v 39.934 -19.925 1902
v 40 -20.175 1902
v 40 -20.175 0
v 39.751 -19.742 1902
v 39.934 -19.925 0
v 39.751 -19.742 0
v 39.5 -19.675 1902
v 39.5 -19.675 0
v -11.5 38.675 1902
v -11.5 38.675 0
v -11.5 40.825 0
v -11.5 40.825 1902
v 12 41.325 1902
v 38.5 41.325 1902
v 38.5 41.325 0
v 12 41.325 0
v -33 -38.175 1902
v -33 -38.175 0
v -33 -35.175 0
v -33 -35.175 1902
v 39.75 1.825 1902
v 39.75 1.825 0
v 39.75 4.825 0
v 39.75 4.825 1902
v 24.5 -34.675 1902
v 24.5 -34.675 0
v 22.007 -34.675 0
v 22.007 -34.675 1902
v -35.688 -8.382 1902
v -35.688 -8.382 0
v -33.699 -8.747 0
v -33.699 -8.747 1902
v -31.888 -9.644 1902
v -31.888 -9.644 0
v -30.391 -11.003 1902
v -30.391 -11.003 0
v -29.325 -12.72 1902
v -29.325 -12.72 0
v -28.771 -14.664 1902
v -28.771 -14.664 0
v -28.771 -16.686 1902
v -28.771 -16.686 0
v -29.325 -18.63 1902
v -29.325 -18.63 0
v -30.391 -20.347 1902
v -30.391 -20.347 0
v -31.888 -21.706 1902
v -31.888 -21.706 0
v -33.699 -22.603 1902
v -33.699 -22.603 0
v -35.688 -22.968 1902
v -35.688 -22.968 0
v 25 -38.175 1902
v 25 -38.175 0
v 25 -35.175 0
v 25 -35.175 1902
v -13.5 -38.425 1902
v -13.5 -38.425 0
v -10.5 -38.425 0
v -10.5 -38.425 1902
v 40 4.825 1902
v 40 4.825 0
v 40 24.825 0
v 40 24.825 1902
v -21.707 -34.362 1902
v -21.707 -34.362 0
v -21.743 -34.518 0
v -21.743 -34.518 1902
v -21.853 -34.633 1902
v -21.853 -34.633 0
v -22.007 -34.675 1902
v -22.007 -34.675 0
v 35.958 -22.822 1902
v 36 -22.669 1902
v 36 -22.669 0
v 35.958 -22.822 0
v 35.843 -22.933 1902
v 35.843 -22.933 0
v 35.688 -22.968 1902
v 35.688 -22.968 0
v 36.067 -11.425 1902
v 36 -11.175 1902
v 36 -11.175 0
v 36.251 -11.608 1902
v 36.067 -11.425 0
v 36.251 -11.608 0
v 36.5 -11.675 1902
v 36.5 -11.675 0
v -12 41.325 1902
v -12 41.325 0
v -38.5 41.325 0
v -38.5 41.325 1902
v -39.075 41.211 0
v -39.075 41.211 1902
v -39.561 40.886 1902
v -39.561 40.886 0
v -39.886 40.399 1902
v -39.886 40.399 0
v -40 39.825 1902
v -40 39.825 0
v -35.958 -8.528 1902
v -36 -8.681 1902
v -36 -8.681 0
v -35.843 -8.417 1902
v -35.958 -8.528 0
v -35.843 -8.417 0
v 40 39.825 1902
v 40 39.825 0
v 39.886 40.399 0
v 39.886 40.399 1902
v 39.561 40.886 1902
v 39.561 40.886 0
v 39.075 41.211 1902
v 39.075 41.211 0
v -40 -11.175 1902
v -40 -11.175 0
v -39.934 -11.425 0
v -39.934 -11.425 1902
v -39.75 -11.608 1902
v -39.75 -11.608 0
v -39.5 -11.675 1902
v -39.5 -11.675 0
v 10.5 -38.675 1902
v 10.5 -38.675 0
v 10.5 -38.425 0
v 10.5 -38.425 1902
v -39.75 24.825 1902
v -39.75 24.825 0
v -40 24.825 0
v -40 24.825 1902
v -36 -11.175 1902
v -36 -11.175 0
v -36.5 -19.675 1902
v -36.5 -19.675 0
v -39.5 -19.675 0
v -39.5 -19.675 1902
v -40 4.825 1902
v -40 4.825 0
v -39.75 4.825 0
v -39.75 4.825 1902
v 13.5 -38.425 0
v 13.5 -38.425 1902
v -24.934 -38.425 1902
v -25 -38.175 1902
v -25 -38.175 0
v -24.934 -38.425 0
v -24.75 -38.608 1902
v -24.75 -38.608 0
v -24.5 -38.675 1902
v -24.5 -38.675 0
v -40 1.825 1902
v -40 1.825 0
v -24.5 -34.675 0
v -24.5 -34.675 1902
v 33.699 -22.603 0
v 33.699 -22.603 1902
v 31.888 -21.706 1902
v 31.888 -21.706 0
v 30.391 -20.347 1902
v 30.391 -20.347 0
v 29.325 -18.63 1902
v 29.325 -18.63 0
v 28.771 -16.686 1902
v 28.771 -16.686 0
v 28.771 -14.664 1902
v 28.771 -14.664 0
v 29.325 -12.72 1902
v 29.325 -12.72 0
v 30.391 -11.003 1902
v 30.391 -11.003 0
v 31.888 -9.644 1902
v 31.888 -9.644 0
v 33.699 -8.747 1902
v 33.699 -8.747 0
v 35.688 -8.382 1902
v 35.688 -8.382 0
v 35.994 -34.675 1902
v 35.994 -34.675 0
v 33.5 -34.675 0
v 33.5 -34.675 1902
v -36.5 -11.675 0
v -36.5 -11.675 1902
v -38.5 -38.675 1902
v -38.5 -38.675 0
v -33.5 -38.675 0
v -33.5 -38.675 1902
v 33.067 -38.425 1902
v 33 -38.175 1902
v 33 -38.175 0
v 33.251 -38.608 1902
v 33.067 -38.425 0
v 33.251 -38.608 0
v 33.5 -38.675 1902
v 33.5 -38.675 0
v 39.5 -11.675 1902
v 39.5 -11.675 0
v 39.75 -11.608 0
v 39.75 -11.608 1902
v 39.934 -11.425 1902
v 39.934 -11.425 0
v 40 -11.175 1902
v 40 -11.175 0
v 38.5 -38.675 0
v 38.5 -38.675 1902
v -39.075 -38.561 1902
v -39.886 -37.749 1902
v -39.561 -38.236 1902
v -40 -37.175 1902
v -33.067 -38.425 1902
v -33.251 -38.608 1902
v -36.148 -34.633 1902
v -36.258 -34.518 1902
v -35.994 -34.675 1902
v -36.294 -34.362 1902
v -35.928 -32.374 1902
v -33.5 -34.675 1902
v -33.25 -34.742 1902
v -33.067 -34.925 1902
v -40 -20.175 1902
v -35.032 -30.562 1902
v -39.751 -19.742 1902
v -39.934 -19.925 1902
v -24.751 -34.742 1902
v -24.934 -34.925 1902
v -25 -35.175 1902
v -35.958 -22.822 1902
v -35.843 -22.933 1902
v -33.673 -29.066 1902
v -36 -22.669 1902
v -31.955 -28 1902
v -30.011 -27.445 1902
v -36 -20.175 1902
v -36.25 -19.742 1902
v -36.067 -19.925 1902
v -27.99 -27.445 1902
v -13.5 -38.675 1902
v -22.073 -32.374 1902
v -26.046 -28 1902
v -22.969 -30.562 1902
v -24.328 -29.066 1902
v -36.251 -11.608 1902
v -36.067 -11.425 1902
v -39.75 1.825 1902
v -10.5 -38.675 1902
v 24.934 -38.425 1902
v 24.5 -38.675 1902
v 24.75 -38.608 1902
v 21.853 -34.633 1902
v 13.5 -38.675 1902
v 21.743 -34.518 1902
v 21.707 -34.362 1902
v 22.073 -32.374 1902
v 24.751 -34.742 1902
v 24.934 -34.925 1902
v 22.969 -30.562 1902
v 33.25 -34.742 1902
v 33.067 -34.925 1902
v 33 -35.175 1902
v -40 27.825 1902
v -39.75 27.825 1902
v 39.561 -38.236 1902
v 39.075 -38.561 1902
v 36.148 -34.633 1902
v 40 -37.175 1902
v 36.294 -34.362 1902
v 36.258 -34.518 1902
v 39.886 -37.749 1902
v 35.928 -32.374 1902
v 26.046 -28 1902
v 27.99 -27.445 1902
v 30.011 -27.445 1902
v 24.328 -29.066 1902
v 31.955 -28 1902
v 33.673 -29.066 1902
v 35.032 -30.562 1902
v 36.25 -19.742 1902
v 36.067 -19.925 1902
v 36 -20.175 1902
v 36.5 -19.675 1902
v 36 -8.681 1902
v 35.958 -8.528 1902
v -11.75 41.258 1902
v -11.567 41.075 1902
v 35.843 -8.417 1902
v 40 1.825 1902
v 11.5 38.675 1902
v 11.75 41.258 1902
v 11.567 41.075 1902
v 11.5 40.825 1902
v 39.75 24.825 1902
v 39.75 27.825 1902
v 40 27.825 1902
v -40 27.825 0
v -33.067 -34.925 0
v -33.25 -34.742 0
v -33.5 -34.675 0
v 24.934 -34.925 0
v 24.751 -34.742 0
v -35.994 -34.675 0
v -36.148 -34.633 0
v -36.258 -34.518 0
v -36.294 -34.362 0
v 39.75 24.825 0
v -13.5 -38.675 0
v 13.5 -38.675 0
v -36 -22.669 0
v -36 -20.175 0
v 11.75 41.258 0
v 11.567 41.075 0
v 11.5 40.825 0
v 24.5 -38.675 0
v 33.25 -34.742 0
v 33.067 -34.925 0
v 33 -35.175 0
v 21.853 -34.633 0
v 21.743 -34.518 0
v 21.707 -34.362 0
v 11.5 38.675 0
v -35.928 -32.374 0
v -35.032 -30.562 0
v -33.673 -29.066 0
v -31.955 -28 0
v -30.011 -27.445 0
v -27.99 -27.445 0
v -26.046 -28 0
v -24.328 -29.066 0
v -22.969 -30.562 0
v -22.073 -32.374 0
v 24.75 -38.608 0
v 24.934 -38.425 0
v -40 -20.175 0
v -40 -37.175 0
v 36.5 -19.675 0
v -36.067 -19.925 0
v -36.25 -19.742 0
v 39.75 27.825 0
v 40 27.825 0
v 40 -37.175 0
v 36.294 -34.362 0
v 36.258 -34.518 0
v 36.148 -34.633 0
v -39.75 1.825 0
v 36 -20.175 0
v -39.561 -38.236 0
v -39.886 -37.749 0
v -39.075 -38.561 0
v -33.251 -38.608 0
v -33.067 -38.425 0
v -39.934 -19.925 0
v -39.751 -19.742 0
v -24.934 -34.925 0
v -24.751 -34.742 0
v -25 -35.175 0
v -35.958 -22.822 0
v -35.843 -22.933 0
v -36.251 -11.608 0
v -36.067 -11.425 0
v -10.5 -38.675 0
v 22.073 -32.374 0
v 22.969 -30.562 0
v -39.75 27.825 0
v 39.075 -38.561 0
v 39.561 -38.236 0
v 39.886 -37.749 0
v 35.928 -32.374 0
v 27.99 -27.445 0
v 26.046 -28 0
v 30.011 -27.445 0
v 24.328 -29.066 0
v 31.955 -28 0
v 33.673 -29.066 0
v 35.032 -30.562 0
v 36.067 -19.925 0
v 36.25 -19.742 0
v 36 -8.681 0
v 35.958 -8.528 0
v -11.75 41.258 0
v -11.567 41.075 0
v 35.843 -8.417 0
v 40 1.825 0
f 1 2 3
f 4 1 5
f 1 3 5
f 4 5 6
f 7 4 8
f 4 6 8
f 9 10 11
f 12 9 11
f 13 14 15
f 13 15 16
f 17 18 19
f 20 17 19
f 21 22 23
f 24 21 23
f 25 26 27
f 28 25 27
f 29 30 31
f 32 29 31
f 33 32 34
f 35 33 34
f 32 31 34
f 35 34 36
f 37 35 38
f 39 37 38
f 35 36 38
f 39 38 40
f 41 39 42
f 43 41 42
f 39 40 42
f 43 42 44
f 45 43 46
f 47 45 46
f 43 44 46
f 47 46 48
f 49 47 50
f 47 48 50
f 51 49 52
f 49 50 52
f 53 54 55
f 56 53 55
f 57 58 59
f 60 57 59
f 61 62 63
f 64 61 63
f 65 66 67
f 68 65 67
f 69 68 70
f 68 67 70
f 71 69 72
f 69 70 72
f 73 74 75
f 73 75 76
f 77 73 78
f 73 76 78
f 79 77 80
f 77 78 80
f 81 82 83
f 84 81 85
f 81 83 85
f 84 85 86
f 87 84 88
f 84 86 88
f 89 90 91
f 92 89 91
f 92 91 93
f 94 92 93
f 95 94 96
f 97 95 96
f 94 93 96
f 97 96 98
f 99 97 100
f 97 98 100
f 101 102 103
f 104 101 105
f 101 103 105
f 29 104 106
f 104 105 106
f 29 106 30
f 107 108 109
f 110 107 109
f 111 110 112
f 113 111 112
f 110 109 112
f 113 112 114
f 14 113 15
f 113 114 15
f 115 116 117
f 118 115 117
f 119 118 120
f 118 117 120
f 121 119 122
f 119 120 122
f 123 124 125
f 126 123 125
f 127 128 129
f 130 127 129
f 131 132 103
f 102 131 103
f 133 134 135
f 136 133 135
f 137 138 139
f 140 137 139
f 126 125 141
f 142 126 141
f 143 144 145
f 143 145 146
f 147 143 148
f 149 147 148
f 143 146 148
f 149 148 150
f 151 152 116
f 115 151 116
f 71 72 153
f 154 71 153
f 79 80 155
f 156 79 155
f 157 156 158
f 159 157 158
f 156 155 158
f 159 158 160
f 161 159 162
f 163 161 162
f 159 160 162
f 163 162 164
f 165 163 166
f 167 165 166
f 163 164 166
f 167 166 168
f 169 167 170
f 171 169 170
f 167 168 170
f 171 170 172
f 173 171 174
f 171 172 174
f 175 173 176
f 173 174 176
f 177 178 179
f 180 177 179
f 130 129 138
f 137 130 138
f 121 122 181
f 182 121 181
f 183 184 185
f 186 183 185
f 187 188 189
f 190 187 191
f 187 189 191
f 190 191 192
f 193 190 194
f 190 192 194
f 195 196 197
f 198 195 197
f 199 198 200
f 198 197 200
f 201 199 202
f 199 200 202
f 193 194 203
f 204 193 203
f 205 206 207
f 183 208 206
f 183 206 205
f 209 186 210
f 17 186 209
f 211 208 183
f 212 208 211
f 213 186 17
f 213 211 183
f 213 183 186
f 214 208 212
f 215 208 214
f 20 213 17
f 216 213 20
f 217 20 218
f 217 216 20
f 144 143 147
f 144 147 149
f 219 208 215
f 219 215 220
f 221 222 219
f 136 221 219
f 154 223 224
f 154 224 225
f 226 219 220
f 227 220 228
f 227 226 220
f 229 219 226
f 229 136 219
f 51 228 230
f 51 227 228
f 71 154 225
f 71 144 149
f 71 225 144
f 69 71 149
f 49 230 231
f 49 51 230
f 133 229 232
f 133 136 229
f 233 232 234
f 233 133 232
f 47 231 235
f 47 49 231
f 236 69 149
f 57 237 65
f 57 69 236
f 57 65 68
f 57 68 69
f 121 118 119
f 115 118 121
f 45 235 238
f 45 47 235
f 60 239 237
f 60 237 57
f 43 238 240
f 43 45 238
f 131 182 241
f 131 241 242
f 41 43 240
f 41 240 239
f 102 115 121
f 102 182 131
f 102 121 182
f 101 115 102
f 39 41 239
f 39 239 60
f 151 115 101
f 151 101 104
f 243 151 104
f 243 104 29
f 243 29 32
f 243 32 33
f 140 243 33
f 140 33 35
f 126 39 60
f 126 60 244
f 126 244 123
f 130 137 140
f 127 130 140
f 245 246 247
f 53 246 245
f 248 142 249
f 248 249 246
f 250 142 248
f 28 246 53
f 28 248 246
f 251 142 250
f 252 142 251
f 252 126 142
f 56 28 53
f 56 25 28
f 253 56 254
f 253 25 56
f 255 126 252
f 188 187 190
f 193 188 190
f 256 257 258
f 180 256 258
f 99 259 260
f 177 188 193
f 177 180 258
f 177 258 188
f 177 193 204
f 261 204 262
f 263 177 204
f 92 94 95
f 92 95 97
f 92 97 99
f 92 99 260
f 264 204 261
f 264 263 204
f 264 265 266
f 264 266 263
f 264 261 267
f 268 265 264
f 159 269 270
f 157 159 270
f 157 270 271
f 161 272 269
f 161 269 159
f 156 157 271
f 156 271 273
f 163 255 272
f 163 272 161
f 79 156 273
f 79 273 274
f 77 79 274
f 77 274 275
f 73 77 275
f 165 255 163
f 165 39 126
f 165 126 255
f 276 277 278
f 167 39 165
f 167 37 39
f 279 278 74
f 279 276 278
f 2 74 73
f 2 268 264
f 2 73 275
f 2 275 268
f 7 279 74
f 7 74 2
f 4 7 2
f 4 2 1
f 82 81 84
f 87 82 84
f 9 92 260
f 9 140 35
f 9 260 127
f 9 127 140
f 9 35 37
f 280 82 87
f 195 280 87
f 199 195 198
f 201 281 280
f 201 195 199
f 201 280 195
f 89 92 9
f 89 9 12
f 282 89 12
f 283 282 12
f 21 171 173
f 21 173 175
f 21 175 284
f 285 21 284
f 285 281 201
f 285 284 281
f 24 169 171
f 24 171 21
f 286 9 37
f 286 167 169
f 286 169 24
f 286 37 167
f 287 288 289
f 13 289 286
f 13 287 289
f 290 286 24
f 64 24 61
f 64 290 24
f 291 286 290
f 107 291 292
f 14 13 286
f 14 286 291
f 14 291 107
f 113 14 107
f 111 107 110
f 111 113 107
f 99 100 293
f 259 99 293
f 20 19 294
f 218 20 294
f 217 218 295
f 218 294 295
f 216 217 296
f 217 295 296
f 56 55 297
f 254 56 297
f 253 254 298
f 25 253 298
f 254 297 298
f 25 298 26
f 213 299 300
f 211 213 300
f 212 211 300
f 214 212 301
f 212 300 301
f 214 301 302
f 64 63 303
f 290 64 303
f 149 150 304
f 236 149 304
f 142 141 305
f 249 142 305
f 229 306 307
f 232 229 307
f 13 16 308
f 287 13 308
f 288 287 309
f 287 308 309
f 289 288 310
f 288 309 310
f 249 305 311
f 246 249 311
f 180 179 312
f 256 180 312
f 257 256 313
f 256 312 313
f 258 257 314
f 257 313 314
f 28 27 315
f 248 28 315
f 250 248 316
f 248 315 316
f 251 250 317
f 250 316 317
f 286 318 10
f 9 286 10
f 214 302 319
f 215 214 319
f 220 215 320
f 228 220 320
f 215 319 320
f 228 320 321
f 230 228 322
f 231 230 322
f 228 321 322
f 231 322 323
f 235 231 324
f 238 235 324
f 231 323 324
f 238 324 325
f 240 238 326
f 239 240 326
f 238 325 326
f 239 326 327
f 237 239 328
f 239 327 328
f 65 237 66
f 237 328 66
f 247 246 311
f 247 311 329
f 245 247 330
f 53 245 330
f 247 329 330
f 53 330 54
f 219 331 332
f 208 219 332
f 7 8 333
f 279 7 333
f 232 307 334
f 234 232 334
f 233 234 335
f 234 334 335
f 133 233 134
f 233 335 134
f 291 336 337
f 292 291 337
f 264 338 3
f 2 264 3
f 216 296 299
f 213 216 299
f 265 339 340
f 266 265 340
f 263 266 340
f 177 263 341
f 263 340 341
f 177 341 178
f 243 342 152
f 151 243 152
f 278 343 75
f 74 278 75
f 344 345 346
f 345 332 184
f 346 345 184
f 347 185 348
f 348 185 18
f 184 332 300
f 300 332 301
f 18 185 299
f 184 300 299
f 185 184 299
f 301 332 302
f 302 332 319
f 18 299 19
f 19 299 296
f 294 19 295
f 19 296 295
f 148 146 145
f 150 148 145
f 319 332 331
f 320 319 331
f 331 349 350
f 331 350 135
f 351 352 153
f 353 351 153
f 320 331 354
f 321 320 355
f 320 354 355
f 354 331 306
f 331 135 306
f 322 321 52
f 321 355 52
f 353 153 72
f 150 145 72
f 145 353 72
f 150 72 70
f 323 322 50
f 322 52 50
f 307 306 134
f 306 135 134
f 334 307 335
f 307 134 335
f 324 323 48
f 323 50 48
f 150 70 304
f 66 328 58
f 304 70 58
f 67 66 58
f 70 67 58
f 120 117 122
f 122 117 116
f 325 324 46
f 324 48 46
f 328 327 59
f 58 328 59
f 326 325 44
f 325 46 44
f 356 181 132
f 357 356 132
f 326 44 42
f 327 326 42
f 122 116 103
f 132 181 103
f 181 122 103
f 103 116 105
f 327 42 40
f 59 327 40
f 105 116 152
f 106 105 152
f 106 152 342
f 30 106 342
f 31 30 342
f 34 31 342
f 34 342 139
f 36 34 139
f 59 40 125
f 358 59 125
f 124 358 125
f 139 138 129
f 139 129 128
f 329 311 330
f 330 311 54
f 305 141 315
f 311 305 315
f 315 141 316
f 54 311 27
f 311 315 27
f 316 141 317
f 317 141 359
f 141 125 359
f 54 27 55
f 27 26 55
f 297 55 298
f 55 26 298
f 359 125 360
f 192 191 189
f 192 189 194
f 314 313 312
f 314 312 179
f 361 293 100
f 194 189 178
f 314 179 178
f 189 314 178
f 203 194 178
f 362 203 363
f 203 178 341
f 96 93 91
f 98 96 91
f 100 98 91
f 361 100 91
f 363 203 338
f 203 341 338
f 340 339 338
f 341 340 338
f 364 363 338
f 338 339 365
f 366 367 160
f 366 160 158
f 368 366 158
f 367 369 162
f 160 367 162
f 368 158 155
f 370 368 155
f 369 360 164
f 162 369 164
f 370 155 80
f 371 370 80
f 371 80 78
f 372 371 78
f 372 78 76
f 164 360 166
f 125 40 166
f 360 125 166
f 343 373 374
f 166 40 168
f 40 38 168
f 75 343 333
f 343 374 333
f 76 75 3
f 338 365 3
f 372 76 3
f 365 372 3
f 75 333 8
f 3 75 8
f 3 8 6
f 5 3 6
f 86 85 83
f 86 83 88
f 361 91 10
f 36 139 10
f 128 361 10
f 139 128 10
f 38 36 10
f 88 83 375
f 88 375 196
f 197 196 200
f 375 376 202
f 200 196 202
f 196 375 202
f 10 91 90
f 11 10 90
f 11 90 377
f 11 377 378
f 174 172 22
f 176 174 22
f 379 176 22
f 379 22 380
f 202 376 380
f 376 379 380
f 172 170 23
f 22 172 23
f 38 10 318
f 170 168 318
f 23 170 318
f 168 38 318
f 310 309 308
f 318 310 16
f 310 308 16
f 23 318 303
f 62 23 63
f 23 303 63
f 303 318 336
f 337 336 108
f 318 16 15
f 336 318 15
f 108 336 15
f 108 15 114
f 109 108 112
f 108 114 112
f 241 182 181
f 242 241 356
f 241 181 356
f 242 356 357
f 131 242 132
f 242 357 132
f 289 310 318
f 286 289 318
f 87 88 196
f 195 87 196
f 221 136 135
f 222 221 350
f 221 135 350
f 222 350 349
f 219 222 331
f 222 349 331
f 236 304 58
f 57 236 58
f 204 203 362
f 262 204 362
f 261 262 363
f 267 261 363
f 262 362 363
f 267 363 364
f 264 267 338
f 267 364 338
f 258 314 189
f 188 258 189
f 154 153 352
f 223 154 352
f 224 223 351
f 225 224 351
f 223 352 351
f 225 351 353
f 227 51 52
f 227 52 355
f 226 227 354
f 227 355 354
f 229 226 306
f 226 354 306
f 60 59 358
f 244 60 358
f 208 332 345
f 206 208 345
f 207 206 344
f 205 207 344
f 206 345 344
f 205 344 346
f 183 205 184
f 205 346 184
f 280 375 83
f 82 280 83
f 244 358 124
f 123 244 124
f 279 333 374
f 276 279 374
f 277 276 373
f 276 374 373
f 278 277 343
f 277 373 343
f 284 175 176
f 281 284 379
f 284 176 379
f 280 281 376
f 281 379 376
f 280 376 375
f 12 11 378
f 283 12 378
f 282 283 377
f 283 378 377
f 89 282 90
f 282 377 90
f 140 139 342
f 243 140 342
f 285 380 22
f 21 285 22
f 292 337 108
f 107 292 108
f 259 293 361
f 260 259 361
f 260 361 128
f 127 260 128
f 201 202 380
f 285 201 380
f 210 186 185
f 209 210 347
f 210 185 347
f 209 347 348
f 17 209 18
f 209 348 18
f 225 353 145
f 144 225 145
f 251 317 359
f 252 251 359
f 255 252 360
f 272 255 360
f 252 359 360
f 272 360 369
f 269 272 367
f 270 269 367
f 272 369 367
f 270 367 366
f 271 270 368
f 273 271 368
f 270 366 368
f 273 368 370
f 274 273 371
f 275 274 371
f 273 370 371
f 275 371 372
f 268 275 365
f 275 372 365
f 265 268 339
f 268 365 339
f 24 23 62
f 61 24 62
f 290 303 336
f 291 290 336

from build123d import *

# Parameters (mm, degrees)
BOSS_EXTRU_1_DEPTH = 1902


with BuildPart() as part:
    # Esquisse1 → Boss.-Extru.1 (new body)
    with BuildSketch(Plane.XY):
        with BuildLine():
            Line((-36.0005, -22.668579891), (-36.0005, -20.175011417))
            ThreePointArc((-36.0005, -20.175011417), (-36.146946609, -19.821458026), (-36.5005, -19.675011417))
            Line((-36.5005, -19.675011417), (-39.5005, -19.675011417))
            ThreePointArc((-39.5005, -19.675011417), (-39.854053391, -19.821458026), (-40.0005, -20.175011417))
            Line((-40.0005, -20.175011417), (-40.0005, -37.175011417))
            ThreePointArc((-40.0005, -37.175011417), (-39.561160172, -38.235671589), (-38.5005, -38.675011417))
            Line((-38.5005, -38.675011417), (-33.5005, -38.675011417))
            ThreePointArc((-33.5005, -38.675011417), (-33.146946609, -38.528564807), (-33.0005, -38.175011417))
            Line((-33.0005, -38.175011417), (-33.0005, -35.175011417))
            ThreePointArc((-33.0005, -35.175011417), (-33.146946609, -34.821458026), (-33.5005, -34.675011417))
            Line((-33.5005, -34.675011417), (-35.994068474, -34.675011417))
            ThreePointArc((-35.994068474, -34.675011417), (-36.210698507, -34.582547988), (-36.293792837, -34.362154274))
            ThreePointArc((-36.293792837, -34.362154274), (-29.0005, -27.375011417), (-21.707207163, -34.362154274))
            ThreePointArc((-21.707207163, -34.362154274), (-21.790301493, -34.582547988), (-22.006931526, -34.675011417))
            Line((-22.006931526, -34.675011417), (-24.5005, -34.675011417))
            ThreePointArc((-24.5005, -34.675011417), (-24.854053391, -34.821458026), (-25.0005, -35.175011417))
            Line((-25.0005, -35.175011417), (-25.0005, -38.175011417))
            ThreePointArc((-25.0005, -38.175011417), (-24.854053391, -38.528564807), (-24.5005, -38.675011417))
            Line((-24.5005, -38.675011417), (-13.5005, -38.675011417))
            Line((-13.5005, -38.675011417), (-13.5005, -38.425011417))
            Line((-13.5005, -38.425011417), (-10.5005, -38.425011417))
            Line((-10.5005, -38.425011417), (-10.5005, -38.675011417))
            Line((-10.5005, -38.675011417), (10.5005, -38.675011417))
            Line((10.5005, -38.675011417), (10.5005, -38.425011417))
            Line((10.5005, -38.425011417), (13.5005, -38.425011417))
            Line((13.5005, -38.425011417), (13.5005, -38.675011417))
            Line((13.5005, -38.675011417), (24.5005, -38.675011417))
            ThreePointArc((24.5005, -38.675011417), (24.854053391, -38.528564807), (25.0005, -38.175011417))
            Line((25.0005, -38.175011417), (25.0005, -35.175011417))
            ThreePointArc((25.0005, -35.175011417), (24.854053391, -34.821458026), (24.5005, -34.675011417))
            Line((24.5005, -34.675011417), (22.006931526, -34.675011417))
            ThreePointArc((22.006931526, -34.675011417), (21.790301493, -34.582547988), (21.707207163, -34.362154274))
            ThreePointArc((21.707207163, -34.362154274), (29.0005, -27.375011417), (36.293792837, -34.362154274))
            ThreePointArc((36.293792837, -34.362154274), (36.210698507, -34.582547988), (35.994068474, -34.675011417))
            Line((35.994068474, -34.675011417), (33.5005, -34.675011417))
            ThreePointArc((33.5005, -34.675011417), (33.146946609, -34.821458026), (33.0005, -35.175011417))
            Line((33.0005, -35.175011417), (33.0005, -38.175011417))
            ThreePointArc((33.0005, -38.175011417), (33.146946609, -38.528564807), (33.5005, -38.675011417))
            Line((33.5005, -38.675011417), (38.5005, -38.675011417))
            ThreePointArc((38.5005, -38.675011417), (39.561160172, -38.235671589), (40.0005, -37.175011417))
            Line((40.0005, -37.175011417), (40.0005, -20.175011417))
            ThreePointArc((40.0005, -20.175011417), (39.854053391, -19.821458026), (39.5005, -19.675011417))
            Line((39.5005, -19.675011417), (36.5005, -19.675011417))
            ThreePointArc((36.5005, -19.675011417), (36.146946609, -19.821458026), (36.0005, -20.175011417))
            Line((36.0005, -20.175011417), (36.0005, -22.668579891))
            ThreePointArc((36.0005, -22.668579891), (35.908036572, -22.885209924), (35.687642857, -22.968304254))
            ThreePointArc((35.687642857, -22.968304254), (28.7005, -15.675011417), (35.687642857, -8.38171858))
            ThreePointArc((35.687642857, -8.38171858), (35.908036572, -8.464812909), (36.0005, -8.681442943))
            Line((36.0005, -8.681442943), (36.0005, -11.175011417))
            ThreePointArc((36.0005, -11.175011417), (36.146946609, -11.528564807), (36.5005, -11.675011417))
            Line((36.5005, -11.675011417), (39.5005, -11.675011417))
            ThreePointArc((39.5005, -11.675011417), (39.854053391, -11.528564807), (40.0005, -11.175011417))
            Line((40.0005, -11.175011417), (40.0005, 1.824988583))
            Line((40.0005, 1.824988583), (39.7505, 1.824988583))
            Line((39.7505, 1.824988583), (39.7505, 4.824988583))
            Line((39.7505, 4.824988583), (40.0005, 4.824988583))
            Line((40.0005, 4.824988583), (40.0005, 24.824988583))
            Line((40.0005, 24.824988583), (39.7505, 24.824988583))
            Line((39.7505, 24.824988583), (39.7505, 27.824988583))
            Line((39.7505, 27.824988583), (40.0005, 27.824988583))
            Line((40.0005, 27.824988583), (40.0005, 39.824988583))
            ThreePointArc((40.0005, 39.824988583), (39.561160172, 40.885648755), (38.5005, 41.324988583))
            Line((38.5005, 41.324988583), (12.0005, 41.324988583))
            ThreePointArc((12.0005, 41.324988583), (11.646946609, 41.178541974), (11.5005, 40.824988583))
            Line((11.5005, 40.824988583), (11.5005, 38.675011417))
            Line((11.5005, 38.675011417), (-11.5005, 38.675011417))
            Line((-11.5005, 38.675011417), (-11.5005, 40.824988583))
            ThreePointArc((-11.5005, 40.824988583), (-11.646946609, 41.178541974), (-12.0005, 41.324988583))
            Line((-12.0005, 41.324988583), (-38.5005, 41.324988583))
            ThreePointArc((-38.5005, 41.324988583), (-39.561160172, 40.885648755), (-40.0005, 39.824988583))
            Line((-40.0005, 39.824988583), (-40.0005, 27.824988583))
            Line((-40.0005, 27.824988583), (-39.7505, 27.824988583))
            Line((-39.7505, 27.824988583), (-39.7505, 24.824988583))
            Line((-39.7505, 24.824988583), (-40.0005, 24.824988583))
            Line((-40.0005, 24.824988583), (-40.0005, 4.824988583))
            Line((-40.0005, 4.824988583), (-39.7505, 4.824988583))
            Line((-39.7505, 4.824988583), (-39.7505, 1.824988583))
            Line((-39.7505, 1.824988583), (-40.0005, 1.824988583))
            Line((-40.0005, 1.824988583), (-40.0005, -11.175011417))
            ThreePointArc((-40.0005, -11.175011417), (-39.854053391, -11.528564807), (-39.5005, -11.675011417))
            Line((-39.5005, -11.675011417), (-36.5005, -11.675011417))
            ThreePointArc((-36.5005, -11.675011417), (-36.146946609, -11.528564807), (-36.0005, -11.175011417))
            Line((-36.0005, -11.175011417), (-36.0005, -8.681442943))
            ThreePointArc((-36.0005, -8.681442943), (-35.908036572, -8.464812909), (-35.687642857, -8.38171858))
            ThreePointArc((-35.687642857, -8.38171858), (-28.7005, -15.675011417), (-35.687642857, -22.968304254))
            ThreePointArc((-35.687642857, -22.968304254), (-35.908036572, -22.885209924), (-36.0005, -22.668579891))
        make_face()
    extrude(amount=BOSS_EXTRU_1_DEPTH)


solid = part.part
